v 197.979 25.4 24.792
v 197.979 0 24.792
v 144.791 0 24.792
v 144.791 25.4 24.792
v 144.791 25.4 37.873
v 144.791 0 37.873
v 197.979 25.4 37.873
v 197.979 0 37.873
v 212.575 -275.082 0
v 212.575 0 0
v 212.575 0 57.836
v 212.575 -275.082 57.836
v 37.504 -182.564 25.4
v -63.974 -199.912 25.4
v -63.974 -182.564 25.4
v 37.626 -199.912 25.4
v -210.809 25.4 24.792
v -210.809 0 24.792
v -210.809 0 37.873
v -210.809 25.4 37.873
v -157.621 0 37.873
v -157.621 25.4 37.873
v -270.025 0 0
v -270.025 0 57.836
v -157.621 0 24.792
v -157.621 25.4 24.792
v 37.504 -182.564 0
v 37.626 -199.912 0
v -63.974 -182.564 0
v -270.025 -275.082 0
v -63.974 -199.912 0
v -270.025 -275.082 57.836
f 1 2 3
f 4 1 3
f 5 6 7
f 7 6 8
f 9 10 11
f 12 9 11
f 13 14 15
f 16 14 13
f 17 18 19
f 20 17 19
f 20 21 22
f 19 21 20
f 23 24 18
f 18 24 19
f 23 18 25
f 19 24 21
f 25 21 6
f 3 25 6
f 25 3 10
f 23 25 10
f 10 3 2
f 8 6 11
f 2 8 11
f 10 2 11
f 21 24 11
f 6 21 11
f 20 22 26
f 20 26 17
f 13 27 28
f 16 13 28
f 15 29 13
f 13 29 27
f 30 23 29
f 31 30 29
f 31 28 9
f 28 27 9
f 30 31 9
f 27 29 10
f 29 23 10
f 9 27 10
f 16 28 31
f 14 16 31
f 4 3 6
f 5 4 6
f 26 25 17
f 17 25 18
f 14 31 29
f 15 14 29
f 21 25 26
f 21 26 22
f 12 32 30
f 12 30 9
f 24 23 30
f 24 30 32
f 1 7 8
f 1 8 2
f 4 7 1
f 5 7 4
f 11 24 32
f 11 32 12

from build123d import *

# Parameters (mm, degrees)
F0_W     = 482.6
F0_H     = 57.8357067246
F1_DEPTH = 275.082
F2_W     = 53.1876
F2_H     = 13.081
F3_DEPTH = 25.4
F5_DEPTH = 25.4


with BuildPart() as f1:
    # F0 (on Front) → F1 (new body)
    with BuildSketch(Plane.XZ):
        with Locations((-28.7254893436, 28.9178533623)):
            Rectangle(F0_W, F0_H)
    extrude(amount=F1_DEPTH)

    # F2 (on face) → F3 (join)
    with BuildSketch(Plane(origin=(0, 0, 0), x_dir=(-1, 0, 0), z_dir=(0, 1, 0))):
        Polygon((-144.7912243771, 37.8729373214), (-197.9788243771, 37.8729373214), (-197.9788243771, 24.7919373214), (-176.1856243771, 24.7919373214), (-144.7912243771, 24.7919373214), align=None)
        with Locations((184.2149756229, 31.3324373214)):
            Rectangle(F2_W, F2_H)
    extrude(amount=F3_DEPTH)

    # F4 (on face) → F5 (cut)
    with BuildSketch(Plane(origin=(0, 0, 0), x_dir=(1, 0, 0), z_dir=(0, 0, -1))):
        Polygon((-63.9737658203, 199.9119593865), (-63.9737658203, 182.5637593865), (37.5036071055, 182.5637593865), (37.6262341797, 199.9119593865), align=None)
    extrude(amount=-F5_DEPTH, mode=Mode.SUBTRACT)


solid = f1.part
